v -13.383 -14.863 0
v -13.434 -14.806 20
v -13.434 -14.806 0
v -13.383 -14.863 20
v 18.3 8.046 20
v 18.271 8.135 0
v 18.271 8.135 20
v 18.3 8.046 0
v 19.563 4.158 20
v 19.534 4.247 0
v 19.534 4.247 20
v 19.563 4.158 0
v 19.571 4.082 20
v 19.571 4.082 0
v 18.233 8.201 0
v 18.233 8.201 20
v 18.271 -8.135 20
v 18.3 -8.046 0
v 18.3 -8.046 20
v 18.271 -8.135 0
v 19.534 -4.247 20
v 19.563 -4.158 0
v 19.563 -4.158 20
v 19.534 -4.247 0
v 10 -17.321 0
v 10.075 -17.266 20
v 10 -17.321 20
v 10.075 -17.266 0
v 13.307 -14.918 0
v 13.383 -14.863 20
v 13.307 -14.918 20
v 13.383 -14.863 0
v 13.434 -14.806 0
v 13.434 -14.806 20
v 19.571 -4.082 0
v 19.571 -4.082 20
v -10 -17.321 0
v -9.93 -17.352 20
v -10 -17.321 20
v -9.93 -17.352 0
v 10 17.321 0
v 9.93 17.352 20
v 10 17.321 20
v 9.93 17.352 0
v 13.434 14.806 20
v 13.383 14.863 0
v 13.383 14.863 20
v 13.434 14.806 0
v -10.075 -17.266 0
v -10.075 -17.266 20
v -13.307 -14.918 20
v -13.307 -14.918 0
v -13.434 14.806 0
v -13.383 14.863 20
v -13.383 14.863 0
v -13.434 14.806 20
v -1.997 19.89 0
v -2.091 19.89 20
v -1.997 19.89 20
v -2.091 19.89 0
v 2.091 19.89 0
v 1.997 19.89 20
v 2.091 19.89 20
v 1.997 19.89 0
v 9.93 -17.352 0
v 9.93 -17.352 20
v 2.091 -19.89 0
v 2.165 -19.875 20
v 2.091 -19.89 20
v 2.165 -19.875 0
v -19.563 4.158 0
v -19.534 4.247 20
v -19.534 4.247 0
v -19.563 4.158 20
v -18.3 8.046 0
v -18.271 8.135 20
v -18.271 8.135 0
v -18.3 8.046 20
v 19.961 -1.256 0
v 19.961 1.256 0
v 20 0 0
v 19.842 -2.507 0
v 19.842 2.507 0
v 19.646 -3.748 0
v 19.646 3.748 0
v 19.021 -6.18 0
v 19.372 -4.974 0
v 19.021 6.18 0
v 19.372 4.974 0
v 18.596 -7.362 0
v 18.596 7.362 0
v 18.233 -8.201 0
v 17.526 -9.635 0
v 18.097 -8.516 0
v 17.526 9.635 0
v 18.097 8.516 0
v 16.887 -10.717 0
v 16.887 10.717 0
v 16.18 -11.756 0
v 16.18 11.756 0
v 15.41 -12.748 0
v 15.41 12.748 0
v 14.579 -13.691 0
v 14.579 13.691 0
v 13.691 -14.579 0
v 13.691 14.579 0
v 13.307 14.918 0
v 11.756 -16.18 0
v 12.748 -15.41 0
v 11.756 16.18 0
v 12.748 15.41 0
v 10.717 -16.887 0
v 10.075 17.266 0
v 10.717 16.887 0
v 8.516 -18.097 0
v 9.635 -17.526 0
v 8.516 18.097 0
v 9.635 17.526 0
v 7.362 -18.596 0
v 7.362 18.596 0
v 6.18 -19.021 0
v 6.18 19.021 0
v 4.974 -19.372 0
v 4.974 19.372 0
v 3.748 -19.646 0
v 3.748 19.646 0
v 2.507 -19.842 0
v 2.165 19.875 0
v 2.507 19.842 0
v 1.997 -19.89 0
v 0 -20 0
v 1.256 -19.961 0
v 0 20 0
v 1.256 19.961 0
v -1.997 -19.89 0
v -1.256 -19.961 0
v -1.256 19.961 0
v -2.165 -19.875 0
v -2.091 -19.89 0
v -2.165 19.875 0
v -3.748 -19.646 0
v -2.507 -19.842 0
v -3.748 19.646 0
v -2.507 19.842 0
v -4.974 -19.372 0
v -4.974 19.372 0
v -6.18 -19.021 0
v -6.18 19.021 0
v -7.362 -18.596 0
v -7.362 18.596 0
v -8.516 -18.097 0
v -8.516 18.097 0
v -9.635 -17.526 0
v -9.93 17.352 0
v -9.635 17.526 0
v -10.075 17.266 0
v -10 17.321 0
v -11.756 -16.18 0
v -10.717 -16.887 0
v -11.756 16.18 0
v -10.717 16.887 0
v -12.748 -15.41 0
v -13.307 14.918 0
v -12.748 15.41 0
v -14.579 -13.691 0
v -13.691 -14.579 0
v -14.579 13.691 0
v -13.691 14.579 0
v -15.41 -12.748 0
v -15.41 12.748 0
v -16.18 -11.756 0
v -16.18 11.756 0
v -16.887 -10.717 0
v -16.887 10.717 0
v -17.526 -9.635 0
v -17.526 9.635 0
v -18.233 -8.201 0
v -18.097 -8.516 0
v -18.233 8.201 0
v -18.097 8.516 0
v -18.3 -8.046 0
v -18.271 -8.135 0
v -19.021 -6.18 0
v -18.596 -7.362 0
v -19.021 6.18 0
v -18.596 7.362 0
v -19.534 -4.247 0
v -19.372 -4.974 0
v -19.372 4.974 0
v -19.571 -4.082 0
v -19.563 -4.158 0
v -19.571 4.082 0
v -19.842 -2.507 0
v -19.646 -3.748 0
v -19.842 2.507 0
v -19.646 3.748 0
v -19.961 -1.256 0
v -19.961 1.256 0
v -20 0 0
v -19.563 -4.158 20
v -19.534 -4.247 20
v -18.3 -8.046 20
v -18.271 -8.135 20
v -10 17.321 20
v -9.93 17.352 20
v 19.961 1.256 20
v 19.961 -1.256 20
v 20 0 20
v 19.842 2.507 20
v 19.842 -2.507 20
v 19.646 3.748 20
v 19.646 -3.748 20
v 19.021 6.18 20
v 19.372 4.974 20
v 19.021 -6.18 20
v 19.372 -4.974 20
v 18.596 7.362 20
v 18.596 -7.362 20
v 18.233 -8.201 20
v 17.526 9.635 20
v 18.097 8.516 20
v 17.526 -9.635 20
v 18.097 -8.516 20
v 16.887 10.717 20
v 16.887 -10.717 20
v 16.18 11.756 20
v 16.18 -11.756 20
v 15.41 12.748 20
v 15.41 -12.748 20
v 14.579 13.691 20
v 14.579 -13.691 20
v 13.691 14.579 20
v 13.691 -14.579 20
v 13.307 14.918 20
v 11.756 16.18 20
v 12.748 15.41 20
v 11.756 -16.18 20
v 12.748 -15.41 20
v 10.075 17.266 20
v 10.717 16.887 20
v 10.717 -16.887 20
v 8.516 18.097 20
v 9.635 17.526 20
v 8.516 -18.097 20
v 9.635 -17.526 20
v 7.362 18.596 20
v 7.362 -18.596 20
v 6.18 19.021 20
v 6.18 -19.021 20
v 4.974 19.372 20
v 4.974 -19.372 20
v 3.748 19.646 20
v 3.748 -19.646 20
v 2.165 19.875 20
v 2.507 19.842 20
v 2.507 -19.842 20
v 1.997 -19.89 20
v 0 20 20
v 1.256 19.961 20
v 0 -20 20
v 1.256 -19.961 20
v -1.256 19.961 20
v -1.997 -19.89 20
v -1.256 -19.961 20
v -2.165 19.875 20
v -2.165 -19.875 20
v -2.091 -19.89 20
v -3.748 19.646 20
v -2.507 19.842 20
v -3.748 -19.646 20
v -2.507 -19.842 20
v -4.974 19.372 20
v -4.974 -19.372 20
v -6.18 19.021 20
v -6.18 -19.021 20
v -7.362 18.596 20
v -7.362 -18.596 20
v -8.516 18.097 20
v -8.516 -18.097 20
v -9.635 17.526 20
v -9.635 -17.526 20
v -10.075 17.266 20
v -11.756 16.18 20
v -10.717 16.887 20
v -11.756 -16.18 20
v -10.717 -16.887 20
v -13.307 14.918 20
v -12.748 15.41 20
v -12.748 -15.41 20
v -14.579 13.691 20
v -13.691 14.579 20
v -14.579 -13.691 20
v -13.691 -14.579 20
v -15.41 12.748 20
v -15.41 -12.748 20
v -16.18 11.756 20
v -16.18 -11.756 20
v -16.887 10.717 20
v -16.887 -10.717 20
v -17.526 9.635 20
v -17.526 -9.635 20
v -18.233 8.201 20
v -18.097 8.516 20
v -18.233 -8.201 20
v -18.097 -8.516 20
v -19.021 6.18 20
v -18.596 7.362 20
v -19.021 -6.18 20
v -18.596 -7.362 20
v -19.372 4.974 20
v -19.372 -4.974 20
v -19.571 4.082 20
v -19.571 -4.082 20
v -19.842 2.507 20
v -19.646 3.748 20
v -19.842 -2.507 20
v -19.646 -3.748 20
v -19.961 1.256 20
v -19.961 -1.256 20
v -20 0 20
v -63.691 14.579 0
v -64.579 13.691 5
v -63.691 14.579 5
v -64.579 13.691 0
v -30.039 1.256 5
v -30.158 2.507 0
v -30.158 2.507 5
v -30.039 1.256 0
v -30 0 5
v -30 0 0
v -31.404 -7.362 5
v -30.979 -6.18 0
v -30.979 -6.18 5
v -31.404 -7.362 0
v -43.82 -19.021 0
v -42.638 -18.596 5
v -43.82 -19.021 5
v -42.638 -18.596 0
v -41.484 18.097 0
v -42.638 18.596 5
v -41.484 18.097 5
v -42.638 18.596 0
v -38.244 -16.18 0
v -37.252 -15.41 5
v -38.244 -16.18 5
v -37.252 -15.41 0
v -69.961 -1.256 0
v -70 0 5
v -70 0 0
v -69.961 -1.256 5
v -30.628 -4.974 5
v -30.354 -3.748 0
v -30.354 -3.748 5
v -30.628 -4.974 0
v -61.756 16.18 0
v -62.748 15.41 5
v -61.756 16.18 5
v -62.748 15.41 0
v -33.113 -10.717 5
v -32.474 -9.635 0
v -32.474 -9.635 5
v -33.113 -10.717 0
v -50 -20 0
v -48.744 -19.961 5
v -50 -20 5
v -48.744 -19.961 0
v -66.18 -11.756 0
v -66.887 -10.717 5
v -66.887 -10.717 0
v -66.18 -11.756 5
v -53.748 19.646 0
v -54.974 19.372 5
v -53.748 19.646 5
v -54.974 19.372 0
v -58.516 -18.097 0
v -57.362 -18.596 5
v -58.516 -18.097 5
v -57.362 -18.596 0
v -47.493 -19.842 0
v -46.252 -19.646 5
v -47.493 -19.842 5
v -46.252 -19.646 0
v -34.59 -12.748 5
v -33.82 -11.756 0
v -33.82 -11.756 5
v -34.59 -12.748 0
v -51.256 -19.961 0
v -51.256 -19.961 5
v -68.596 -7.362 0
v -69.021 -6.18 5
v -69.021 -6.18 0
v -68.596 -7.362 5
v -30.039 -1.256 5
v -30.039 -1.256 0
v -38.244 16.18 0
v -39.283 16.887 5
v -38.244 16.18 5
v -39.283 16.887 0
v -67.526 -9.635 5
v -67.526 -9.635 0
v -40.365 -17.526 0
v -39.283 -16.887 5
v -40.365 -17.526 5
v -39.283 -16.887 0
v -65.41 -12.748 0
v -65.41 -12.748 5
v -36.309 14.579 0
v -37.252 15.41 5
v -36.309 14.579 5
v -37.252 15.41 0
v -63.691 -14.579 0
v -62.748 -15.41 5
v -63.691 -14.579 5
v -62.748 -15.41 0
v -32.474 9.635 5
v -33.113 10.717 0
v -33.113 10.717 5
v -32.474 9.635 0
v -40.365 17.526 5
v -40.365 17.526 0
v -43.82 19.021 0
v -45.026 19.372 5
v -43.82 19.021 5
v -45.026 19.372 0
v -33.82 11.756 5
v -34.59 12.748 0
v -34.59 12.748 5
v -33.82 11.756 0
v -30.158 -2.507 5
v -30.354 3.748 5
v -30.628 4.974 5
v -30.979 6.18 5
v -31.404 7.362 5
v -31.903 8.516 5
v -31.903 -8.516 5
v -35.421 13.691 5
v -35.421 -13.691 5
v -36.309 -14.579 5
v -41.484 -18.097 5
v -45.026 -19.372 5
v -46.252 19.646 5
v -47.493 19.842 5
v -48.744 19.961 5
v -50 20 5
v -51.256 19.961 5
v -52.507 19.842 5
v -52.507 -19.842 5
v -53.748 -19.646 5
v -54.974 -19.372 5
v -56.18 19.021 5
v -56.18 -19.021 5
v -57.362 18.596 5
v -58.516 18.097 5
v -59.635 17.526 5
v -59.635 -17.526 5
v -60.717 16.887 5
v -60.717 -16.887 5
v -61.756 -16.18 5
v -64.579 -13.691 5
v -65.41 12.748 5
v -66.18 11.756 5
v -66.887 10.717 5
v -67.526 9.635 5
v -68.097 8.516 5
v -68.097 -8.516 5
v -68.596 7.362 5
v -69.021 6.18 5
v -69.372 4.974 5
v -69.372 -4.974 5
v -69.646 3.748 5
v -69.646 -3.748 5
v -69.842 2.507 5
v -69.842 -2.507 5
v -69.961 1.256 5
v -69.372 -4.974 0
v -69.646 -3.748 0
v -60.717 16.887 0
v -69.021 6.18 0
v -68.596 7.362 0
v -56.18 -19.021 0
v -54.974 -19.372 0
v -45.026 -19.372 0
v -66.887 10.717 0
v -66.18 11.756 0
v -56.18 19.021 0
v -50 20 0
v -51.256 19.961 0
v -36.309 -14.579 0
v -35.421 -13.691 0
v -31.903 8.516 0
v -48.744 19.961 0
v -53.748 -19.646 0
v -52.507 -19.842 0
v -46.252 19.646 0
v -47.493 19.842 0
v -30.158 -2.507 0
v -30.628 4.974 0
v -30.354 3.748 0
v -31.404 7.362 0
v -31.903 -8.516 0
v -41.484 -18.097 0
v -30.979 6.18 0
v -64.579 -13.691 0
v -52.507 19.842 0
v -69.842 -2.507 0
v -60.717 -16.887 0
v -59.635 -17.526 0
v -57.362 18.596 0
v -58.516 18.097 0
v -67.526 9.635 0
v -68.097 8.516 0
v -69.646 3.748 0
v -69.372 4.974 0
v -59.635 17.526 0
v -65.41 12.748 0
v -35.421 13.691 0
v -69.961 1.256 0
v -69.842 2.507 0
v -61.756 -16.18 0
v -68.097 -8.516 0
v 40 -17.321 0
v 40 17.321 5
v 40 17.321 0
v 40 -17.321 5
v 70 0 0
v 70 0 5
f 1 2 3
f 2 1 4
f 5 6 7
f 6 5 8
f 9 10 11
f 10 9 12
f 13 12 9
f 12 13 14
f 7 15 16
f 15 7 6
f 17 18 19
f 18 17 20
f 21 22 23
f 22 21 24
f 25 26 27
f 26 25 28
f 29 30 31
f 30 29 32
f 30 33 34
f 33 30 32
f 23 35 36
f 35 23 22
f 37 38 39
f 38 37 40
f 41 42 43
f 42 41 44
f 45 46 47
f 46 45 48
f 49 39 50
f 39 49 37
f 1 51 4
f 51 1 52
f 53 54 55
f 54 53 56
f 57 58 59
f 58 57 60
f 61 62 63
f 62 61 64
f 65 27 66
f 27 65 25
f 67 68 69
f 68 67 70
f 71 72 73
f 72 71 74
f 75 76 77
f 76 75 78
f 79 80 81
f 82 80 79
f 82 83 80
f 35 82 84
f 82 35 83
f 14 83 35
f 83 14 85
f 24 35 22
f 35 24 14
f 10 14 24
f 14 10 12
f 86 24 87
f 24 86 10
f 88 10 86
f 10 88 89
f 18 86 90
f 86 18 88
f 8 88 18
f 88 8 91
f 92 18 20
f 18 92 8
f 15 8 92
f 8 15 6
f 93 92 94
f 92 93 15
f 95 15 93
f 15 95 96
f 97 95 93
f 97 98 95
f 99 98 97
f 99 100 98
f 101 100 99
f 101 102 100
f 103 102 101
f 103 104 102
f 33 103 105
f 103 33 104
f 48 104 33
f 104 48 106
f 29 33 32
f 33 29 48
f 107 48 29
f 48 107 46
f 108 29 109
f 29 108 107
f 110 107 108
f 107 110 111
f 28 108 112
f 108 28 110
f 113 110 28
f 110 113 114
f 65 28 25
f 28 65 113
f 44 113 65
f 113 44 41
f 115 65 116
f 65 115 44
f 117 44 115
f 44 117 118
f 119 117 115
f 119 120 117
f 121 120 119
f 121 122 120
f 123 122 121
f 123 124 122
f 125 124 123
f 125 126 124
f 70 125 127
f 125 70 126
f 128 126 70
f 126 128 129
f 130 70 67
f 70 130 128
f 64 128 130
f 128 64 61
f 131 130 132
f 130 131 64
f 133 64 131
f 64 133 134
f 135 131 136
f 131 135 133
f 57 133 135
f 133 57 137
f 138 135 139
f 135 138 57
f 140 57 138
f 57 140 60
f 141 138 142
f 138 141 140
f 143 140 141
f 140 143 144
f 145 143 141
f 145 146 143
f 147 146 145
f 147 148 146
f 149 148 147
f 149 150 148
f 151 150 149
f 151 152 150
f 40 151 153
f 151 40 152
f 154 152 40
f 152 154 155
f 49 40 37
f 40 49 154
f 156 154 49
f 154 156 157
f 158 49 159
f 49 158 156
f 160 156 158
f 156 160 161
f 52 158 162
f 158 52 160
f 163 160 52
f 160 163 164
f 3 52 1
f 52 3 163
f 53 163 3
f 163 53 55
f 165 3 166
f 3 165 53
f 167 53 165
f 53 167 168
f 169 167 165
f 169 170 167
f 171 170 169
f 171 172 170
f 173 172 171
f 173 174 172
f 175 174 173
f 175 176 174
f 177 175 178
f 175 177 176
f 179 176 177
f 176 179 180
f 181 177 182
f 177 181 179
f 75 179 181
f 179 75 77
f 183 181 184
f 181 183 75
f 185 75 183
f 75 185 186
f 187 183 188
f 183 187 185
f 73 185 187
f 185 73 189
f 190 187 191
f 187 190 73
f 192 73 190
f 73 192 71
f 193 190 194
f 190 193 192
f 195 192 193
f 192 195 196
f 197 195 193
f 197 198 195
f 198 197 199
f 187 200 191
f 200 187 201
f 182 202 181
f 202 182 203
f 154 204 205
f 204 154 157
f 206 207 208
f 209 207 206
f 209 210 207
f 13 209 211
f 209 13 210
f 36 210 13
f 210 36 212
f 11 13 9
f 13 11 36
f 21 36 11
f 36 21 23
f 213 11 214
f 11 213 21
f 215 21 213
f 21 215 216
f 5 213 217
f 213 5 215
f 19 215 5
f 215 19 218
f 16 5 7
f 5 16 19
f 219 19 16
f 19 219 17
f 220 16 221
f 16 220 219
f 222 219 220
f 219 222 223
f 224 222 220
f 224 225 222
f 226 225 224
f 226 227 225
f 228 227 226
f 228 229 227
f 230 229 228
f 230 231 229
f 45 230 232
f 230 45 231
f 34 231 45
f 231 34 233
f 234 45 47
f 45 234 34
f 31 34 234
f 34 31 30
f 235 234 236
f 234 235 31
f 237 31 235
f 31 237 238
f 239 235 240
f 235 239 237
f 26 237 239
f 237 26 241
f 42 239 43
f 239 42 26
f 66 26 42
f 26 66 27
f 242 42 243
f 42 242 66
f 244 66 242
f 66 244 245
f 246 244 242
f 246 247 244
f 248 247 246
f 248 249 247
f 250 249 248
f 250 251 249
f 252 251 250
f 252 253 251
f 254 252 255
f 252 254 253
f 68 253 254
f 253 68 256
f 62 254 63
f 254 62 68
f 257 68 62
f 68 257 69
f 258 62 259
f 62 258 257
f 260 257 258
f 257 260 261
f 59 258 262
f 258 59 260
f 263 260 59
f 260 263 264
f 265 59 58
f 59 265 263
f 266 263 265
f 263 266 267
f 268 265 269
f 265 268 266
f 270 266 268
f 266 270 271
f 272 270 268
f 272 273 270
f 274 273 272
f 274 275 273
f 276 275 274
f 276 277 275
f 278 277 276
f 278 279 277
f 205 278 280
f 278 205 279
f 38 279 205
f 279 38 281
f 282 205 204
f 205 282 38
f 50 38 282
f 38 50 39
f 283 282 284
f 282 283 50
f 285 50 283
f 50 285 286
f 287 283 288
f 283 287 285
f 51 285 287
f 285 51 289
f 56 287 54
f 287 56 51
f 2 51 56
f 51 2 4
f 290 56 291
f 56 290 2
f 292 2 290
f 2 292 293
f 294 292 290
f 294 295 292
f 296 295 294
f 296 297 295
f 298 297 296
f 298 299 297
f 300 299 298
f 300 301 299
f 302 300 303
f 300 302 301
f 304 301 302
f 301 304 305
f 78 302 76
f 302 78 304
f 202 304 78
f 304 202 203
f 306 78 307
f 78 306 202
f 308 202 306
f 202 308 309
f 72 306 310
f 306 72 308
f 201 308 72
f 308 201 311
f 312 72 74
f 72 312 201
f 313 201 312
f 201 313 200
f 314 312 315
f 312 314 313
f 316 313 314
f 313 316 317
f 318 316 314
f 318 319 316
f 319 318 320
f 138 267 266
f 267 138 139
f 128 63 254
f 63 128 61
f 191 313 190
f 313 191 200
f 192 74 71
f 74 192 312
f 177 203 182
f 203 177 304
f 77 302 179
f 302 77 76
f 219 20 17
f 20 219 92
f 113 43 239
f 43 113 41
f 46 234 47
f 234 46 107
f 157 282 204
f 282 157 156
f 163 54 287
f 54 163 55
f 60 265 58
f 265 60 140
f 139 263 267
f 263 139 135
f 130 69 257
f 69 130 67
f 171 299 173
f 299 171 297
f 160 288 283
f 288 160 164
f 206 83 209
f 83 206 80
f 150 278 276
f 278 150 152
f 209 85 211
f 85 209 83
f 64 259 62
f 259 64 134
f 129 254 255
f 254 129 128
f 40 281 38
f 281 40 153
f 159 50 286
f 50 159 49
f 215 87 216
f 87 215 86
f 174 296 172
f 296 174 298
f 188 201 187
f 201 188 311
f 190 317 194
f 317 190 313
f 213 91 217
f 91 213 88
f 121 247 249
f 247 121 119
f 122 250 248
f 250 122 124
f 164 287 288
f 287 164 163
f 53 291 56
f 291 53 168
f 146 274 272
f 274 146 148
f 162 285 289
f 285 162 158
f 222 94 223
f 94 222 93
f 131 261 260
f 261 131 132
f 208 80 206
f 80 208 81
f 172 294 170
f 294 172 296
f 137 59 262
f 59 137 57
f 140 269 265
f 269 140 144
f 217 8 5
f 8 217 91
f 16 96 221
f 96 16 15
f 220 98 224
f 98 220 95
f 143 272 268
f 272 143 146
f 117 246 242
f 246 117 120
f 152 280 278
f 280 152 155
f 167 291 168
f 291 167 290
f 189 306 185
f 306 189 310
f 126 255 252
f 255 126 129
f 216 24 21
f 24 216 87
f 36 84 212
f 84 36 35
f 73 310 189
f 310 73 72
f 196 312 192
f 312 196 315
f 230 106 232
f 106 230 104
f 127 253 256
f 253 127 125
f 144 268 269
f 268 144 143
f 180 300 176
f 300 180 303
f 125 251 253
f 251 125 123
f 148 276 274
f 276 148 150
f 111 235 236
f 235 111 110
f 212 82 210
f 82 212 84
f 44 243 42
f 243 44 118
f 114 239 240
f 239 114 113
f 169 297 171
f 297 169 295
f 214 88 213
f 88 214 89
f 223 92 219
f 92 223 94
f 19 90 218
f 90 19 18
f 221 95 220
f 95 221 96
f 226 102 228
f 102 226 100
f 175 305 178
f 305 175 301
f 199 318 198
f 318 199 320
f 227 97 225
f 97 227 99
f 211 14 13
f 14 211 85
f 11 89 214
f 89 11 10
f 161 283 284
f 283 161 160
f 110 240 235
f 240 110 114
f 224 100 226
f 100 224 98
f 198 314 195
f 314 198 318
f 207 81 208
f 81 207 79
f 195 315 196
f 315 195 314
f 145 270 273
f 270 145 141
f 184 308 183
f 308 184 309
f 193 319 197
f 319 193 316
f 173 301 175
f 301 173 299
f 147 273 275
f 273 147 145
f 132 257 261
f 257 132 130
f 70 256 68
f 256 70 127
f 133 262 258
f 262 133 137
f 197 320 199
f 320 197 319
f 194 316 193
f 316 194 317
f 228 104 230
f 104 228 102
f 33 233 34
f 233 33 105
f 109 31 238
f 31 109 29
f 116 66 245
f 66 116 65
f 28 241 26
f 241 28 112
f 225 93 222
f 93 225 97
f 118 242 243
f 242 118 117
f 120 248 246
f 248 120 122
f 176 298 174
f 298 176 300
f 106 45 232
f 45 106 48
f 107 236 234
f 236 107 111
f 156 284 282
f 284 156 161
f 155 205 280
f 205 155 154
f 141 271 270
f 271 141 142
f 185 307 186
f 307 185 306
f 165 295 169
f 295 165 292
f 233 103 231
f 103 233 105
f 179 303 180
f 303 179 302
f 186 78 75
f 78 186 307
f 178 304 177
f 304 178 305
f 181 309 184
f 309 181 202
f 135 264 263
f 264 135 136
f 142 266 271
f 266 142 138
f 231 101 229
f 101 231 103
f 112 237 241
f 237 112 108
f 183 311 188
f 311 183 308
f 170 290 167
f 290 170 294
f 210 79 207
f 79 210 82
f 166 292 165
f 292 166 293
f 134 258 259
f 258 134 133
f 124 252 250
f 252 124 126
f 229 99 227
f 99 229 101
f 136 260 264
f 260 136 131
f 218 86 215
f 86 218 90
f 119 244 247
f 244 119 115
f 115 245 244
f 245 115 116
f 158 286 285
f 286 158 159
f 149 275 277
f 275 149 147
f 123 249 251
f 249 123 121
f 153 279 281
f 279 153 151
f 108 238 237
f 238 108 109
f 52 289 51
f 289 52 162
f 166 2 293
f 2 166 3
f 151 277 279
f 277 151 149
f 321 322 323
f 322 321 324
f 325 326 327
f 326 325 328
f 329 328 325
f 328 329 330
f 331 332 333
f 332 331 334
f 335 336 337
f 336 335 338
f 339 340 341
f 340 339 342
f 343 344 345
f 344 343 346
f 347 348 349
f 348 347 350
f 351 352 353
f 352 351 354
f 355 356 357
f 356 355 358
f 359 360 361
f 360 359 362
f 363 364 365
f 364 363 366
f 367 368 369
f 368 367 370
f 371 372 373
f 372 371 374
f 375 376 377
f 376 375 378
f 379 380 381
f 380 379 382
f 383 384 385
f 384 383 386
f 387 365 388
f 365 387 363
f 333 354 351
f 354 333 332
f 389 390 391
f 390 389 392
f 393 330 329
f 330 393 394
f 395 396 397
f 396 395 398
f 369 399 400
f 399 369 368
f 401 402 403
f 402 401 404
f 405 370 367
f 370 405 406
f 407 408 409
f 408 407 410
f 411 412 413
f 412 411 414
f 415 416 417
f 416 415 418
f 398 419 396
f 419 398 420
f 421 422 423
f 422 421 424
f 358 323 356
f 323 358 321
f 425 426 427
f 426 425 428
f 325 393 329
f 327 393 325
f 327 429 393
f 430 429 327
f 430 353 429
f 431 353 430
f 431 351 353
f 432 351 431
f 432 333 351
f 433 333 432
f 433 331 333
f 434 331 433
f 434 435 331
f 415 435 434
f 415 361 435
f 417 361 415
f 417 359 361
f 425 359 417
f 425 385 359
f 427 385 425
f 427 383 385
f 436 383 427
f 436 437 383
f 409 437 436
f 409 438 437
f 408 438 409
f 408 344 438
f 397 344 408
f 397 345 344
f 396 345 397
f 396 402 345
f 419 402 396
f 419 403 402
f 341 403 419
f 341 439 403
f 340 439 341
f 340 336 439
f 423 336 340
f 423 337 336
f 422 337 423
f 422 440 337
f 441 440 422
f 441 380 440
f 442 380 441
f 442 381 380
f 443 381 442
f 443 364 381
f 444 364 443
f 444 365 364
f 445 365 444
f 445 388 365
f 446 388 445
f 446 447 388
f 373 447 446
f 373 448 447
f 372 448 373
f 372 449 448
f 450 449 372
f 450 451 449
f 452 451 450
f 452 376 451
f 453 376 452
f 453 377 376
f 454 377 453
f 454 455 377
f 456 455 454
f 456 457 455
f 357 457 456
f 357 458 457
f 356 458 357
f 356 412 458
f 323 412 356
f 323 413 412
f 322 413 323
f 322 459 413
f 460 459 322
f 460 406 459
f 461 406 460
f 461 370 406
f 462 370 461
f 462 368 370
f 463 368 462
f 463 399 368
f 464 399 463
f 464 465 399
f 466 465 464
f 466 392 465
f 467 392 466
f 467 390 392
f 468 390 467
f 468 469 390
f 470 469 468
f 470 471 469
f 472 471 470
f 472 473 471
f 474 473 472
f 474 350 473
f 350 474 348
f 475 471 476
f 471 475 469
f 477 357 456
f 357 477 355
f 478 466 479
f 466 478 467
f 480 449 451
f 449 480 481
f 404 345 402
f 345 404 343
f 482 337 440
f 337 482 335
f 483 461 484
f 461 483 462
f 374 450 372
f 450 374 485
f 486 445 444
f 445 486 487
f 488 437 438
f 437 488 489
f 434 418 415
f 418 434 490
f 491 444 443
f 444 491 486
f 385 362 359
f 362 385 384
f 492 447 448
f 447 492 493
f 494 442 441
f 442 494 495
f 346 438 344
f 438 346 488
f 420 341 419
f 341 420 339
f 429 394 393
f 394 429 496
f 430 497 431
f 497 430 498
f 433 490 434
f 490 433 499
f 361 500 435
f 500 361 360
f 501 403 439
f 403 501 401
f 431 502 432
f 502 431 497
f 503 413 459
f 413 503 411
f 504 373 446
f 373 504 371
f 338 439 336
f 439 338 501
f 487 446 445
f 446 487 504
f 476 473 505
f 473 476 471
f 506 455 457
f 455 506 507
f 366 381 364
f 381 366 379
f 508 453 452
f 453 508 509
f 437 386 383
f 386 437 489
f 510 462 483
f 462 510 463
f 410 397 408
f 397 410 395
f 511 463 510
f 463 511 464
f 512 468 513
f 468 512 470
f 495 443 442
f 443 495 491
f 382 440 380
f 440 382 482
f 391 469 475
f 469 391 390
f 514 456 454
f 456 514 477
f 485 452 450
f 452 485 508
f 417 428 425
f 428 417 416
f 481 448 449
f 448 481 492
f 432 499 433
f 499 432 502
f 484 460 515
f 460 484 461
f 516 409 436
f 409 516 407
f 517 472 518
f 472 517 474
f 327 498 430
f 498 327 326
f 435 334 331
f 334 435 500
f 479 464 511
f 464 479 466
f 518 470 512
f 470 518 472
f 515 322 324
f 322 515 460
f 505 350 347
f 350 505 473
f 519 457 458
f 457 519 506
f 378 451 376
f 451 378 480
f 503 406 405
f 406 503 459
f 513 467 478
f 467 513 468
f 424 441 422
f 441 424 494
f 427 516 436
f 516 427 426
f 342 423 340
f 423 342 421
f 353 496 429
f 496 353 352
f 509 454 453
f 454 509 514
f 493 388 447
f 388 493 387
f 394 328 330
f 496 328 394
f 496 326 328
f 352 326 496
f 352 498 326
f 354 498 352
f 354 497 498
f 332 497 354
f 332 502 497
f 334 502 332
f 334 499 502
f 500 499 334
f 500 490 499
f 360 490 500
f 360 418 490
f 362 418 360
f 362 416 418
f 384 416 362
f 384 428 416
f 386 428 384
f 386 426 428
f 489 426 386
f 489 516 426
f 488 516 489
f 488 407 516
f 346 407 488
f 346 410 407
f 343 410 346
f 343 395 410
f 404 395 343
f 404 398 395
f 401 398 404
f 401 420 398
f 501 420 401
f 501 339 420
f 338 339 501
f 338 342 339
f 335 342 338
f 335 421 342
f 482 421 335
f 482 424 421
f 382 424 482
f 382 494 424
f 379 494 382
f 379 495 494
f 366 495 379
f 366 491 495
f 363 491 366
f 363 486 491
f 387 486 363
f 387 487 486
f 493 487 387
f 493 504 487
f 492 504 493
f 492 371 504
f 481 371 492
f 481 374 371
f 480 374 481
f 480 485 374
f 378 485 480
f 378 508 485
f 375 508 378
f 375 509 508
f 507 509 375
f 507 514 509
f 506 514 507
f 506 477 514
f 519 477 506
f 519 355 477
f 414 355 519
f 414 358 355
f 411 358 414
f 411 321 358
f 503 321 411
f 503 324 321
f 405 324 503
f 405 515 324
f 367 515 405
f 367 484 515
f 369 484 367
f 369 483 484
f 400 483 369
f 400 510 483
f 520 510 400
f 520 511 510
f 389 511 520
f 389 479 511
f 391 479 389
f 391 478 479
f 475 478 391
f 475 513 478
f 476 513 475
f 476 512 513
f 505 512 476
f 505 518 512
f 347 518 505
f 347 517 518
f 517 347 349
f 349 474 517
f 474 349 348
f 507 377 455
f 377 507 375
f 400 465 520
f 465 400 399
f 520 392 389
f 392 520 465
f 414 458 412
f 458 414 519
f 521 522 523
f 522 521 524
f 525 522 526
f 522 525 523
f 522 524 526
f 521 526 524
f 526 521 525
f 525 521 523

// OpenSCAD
// 03 Cylindres

// =========================================
// D'après le micro-tutoriel vidéo https://www.youtube.com/watch?v=OdUgqYm5lXQ&index=3&list=PL2CED4B0A8EA522CF par Juan Gonzalez Gomez.
//==========================================

//Dans ce tuto nous allons créer et manipuler des cylindres qui sont le couteau suisse de la conception assistée par ordinateur ou CAO. 

// Pour faire un cylindre basique vous utiliserez la commande cylinder dans laquelle vous spécifierez le rayon du cylindre avec le paramètre r. Par exemple pour un rayon de 20 millimètres il faudra écrire r = 20. La hauteur est spécifiée par le paramètre h. 

cylinder ( r = 20, h = 20 ) ;

// N'oubliez pas d'appuyer sur F5 pour voir le cylindre s'afficher. 

// Remarquez que par défaut votre cylindre est couché sur le sol (c'est à dire le plan XY). 

// Remarquez aussi qu'il est centré sur l'axe Z.

// Observez bien votre cylindre, rapprochez la vue en zoomant si besoin. Est-ce vraiment un cylindre? En fait non, c'est un polyèdre, car tout objet 3D est representé dans OpenSCAD comme un polyèdre. Nous verrons à continuation comment modifier le nombre de faces polygonales utilisées pour representer le cylindre. 

// À fin de rendre le cylindre plus lisse nous pouvons changer le nombre de rectangles utilisés pour faire le rendu du contour du cylindre. Avec plus de rectangles, chaque rectangle sera moins perceptible et notre objet aura sera perçu comme moins anguleux et plus lisse. Le nombre de face polygonales est gouverné par le paramètre $fn.

cylinder ( r = 20, h = 20 , $fn = 100) ;

// N'oubliez pas d'appuyer sur F5 pour voir le nouveau cylindre.

// Lors de la création du cylindre, nous pouvons spécifier le diamètre à la place du rayon, avec le paramètre d. 

//Par exemple, pour créer une monnaie, nous gardons le même diamètre en passant en paramètre un diamètre égal au double du rayon de tout à l'heure. De plus, nous applatissons la pièce en changeant sont hauteur. 

cylinder ( d = 40, h = 5 , $fn = 100) ;

// Observez maintenant que'est-ce qui se passe lorsque vous changez le numéro de côtés à un petit nombre. Pour commencer, faisons par exemple $fn = 6.

cylinder ( d = 40, h = 5 , $fn = 6) ;

// N'oubliez pas d'appuyer sur F5 pour afficher. 

// Voyez-vous la pièce hexagonale? Alors voilà, dans OpenSCAD, une pièce hexagonale s'obtient en appelant la commande cylinder avec 6 côté. Pourtant, du point de vue du vocabulaire mathématique ce n'est pas un cylindre, mais la commande utilisée évoque le mot "cylindre".

// Vous pouvez faire des pièces en forme de n'importe quel polygône régulier avec la commande cylinder - changez tout simplement le numéro de côtés.

// Par exemple, pour un pentagone régulier, faites 
// $fn = 5

cylinder ( d = 40, h = 5 , $fn = 5) ;

// Alors que pour un triangle équilateral il faudra appeler cylinder avec le paramètre $fn = 3.

cylinder ( d = 40, h = 5 , $fn = 3) ;

// Vous allez maintenant peaufiner la présentation de votre fichier pour garder les trois types de pièces que vous avez appris à faire dans ce tutoriel.

// Déplacez légèrement la monnaie créée toute à l'heure avec la commande cylindre et les 100 côtés pour un aperçu lisse. Rappelez-vous que la commande pour faire des translations est translate. Commentez votre code !  

//-- Monnaie
translate([-50,0,0]) 
  cylinder ( d = 40, h = 5, $fn = 100);

// Re-faisons maintenant la pièce hexagonale. Reprenons le code de la monnaie et changeons le nombre de côtés à 6. Nous ne le déplaçons pas, par défaut la pièce est posée sur l'origine, ce qui nous convient déjà.

cylinder ( d = 40, h = 5, $fn = 6);

// Re-faisons enfin la pièce en forme de triangle équilateral. Nous demandons à avoir trois côtés avec $fn = 3. Nous déplaçons la pièce avec translate. 

translate([50,0,0]) 
  cylinder ( d = 40, h = 5, $fn = 3);

// Vous savez desormais faire toute sorte de pièces polygonales avec la commande cylinder. Pour finir, documentez tout votre code et n'oubliez pas de sauvegarder votre fichier (et d'exporter au format STL si vous souhaitez imprimez le résultat)

//-- Exemples de pièces hexagonales ou cylindriques

//-- Monnaie
translate([-50,0,0]) 
  cylinder ( d = 40, h = 5, $fn = 100);

//-- Hexagone
cylinder ( d = 40, h = 5, $fn = 6);

//-- Triangle équilateral
translate([50,0,0])
  cylinder ( d = 40, h = 5, $fn = 3);
